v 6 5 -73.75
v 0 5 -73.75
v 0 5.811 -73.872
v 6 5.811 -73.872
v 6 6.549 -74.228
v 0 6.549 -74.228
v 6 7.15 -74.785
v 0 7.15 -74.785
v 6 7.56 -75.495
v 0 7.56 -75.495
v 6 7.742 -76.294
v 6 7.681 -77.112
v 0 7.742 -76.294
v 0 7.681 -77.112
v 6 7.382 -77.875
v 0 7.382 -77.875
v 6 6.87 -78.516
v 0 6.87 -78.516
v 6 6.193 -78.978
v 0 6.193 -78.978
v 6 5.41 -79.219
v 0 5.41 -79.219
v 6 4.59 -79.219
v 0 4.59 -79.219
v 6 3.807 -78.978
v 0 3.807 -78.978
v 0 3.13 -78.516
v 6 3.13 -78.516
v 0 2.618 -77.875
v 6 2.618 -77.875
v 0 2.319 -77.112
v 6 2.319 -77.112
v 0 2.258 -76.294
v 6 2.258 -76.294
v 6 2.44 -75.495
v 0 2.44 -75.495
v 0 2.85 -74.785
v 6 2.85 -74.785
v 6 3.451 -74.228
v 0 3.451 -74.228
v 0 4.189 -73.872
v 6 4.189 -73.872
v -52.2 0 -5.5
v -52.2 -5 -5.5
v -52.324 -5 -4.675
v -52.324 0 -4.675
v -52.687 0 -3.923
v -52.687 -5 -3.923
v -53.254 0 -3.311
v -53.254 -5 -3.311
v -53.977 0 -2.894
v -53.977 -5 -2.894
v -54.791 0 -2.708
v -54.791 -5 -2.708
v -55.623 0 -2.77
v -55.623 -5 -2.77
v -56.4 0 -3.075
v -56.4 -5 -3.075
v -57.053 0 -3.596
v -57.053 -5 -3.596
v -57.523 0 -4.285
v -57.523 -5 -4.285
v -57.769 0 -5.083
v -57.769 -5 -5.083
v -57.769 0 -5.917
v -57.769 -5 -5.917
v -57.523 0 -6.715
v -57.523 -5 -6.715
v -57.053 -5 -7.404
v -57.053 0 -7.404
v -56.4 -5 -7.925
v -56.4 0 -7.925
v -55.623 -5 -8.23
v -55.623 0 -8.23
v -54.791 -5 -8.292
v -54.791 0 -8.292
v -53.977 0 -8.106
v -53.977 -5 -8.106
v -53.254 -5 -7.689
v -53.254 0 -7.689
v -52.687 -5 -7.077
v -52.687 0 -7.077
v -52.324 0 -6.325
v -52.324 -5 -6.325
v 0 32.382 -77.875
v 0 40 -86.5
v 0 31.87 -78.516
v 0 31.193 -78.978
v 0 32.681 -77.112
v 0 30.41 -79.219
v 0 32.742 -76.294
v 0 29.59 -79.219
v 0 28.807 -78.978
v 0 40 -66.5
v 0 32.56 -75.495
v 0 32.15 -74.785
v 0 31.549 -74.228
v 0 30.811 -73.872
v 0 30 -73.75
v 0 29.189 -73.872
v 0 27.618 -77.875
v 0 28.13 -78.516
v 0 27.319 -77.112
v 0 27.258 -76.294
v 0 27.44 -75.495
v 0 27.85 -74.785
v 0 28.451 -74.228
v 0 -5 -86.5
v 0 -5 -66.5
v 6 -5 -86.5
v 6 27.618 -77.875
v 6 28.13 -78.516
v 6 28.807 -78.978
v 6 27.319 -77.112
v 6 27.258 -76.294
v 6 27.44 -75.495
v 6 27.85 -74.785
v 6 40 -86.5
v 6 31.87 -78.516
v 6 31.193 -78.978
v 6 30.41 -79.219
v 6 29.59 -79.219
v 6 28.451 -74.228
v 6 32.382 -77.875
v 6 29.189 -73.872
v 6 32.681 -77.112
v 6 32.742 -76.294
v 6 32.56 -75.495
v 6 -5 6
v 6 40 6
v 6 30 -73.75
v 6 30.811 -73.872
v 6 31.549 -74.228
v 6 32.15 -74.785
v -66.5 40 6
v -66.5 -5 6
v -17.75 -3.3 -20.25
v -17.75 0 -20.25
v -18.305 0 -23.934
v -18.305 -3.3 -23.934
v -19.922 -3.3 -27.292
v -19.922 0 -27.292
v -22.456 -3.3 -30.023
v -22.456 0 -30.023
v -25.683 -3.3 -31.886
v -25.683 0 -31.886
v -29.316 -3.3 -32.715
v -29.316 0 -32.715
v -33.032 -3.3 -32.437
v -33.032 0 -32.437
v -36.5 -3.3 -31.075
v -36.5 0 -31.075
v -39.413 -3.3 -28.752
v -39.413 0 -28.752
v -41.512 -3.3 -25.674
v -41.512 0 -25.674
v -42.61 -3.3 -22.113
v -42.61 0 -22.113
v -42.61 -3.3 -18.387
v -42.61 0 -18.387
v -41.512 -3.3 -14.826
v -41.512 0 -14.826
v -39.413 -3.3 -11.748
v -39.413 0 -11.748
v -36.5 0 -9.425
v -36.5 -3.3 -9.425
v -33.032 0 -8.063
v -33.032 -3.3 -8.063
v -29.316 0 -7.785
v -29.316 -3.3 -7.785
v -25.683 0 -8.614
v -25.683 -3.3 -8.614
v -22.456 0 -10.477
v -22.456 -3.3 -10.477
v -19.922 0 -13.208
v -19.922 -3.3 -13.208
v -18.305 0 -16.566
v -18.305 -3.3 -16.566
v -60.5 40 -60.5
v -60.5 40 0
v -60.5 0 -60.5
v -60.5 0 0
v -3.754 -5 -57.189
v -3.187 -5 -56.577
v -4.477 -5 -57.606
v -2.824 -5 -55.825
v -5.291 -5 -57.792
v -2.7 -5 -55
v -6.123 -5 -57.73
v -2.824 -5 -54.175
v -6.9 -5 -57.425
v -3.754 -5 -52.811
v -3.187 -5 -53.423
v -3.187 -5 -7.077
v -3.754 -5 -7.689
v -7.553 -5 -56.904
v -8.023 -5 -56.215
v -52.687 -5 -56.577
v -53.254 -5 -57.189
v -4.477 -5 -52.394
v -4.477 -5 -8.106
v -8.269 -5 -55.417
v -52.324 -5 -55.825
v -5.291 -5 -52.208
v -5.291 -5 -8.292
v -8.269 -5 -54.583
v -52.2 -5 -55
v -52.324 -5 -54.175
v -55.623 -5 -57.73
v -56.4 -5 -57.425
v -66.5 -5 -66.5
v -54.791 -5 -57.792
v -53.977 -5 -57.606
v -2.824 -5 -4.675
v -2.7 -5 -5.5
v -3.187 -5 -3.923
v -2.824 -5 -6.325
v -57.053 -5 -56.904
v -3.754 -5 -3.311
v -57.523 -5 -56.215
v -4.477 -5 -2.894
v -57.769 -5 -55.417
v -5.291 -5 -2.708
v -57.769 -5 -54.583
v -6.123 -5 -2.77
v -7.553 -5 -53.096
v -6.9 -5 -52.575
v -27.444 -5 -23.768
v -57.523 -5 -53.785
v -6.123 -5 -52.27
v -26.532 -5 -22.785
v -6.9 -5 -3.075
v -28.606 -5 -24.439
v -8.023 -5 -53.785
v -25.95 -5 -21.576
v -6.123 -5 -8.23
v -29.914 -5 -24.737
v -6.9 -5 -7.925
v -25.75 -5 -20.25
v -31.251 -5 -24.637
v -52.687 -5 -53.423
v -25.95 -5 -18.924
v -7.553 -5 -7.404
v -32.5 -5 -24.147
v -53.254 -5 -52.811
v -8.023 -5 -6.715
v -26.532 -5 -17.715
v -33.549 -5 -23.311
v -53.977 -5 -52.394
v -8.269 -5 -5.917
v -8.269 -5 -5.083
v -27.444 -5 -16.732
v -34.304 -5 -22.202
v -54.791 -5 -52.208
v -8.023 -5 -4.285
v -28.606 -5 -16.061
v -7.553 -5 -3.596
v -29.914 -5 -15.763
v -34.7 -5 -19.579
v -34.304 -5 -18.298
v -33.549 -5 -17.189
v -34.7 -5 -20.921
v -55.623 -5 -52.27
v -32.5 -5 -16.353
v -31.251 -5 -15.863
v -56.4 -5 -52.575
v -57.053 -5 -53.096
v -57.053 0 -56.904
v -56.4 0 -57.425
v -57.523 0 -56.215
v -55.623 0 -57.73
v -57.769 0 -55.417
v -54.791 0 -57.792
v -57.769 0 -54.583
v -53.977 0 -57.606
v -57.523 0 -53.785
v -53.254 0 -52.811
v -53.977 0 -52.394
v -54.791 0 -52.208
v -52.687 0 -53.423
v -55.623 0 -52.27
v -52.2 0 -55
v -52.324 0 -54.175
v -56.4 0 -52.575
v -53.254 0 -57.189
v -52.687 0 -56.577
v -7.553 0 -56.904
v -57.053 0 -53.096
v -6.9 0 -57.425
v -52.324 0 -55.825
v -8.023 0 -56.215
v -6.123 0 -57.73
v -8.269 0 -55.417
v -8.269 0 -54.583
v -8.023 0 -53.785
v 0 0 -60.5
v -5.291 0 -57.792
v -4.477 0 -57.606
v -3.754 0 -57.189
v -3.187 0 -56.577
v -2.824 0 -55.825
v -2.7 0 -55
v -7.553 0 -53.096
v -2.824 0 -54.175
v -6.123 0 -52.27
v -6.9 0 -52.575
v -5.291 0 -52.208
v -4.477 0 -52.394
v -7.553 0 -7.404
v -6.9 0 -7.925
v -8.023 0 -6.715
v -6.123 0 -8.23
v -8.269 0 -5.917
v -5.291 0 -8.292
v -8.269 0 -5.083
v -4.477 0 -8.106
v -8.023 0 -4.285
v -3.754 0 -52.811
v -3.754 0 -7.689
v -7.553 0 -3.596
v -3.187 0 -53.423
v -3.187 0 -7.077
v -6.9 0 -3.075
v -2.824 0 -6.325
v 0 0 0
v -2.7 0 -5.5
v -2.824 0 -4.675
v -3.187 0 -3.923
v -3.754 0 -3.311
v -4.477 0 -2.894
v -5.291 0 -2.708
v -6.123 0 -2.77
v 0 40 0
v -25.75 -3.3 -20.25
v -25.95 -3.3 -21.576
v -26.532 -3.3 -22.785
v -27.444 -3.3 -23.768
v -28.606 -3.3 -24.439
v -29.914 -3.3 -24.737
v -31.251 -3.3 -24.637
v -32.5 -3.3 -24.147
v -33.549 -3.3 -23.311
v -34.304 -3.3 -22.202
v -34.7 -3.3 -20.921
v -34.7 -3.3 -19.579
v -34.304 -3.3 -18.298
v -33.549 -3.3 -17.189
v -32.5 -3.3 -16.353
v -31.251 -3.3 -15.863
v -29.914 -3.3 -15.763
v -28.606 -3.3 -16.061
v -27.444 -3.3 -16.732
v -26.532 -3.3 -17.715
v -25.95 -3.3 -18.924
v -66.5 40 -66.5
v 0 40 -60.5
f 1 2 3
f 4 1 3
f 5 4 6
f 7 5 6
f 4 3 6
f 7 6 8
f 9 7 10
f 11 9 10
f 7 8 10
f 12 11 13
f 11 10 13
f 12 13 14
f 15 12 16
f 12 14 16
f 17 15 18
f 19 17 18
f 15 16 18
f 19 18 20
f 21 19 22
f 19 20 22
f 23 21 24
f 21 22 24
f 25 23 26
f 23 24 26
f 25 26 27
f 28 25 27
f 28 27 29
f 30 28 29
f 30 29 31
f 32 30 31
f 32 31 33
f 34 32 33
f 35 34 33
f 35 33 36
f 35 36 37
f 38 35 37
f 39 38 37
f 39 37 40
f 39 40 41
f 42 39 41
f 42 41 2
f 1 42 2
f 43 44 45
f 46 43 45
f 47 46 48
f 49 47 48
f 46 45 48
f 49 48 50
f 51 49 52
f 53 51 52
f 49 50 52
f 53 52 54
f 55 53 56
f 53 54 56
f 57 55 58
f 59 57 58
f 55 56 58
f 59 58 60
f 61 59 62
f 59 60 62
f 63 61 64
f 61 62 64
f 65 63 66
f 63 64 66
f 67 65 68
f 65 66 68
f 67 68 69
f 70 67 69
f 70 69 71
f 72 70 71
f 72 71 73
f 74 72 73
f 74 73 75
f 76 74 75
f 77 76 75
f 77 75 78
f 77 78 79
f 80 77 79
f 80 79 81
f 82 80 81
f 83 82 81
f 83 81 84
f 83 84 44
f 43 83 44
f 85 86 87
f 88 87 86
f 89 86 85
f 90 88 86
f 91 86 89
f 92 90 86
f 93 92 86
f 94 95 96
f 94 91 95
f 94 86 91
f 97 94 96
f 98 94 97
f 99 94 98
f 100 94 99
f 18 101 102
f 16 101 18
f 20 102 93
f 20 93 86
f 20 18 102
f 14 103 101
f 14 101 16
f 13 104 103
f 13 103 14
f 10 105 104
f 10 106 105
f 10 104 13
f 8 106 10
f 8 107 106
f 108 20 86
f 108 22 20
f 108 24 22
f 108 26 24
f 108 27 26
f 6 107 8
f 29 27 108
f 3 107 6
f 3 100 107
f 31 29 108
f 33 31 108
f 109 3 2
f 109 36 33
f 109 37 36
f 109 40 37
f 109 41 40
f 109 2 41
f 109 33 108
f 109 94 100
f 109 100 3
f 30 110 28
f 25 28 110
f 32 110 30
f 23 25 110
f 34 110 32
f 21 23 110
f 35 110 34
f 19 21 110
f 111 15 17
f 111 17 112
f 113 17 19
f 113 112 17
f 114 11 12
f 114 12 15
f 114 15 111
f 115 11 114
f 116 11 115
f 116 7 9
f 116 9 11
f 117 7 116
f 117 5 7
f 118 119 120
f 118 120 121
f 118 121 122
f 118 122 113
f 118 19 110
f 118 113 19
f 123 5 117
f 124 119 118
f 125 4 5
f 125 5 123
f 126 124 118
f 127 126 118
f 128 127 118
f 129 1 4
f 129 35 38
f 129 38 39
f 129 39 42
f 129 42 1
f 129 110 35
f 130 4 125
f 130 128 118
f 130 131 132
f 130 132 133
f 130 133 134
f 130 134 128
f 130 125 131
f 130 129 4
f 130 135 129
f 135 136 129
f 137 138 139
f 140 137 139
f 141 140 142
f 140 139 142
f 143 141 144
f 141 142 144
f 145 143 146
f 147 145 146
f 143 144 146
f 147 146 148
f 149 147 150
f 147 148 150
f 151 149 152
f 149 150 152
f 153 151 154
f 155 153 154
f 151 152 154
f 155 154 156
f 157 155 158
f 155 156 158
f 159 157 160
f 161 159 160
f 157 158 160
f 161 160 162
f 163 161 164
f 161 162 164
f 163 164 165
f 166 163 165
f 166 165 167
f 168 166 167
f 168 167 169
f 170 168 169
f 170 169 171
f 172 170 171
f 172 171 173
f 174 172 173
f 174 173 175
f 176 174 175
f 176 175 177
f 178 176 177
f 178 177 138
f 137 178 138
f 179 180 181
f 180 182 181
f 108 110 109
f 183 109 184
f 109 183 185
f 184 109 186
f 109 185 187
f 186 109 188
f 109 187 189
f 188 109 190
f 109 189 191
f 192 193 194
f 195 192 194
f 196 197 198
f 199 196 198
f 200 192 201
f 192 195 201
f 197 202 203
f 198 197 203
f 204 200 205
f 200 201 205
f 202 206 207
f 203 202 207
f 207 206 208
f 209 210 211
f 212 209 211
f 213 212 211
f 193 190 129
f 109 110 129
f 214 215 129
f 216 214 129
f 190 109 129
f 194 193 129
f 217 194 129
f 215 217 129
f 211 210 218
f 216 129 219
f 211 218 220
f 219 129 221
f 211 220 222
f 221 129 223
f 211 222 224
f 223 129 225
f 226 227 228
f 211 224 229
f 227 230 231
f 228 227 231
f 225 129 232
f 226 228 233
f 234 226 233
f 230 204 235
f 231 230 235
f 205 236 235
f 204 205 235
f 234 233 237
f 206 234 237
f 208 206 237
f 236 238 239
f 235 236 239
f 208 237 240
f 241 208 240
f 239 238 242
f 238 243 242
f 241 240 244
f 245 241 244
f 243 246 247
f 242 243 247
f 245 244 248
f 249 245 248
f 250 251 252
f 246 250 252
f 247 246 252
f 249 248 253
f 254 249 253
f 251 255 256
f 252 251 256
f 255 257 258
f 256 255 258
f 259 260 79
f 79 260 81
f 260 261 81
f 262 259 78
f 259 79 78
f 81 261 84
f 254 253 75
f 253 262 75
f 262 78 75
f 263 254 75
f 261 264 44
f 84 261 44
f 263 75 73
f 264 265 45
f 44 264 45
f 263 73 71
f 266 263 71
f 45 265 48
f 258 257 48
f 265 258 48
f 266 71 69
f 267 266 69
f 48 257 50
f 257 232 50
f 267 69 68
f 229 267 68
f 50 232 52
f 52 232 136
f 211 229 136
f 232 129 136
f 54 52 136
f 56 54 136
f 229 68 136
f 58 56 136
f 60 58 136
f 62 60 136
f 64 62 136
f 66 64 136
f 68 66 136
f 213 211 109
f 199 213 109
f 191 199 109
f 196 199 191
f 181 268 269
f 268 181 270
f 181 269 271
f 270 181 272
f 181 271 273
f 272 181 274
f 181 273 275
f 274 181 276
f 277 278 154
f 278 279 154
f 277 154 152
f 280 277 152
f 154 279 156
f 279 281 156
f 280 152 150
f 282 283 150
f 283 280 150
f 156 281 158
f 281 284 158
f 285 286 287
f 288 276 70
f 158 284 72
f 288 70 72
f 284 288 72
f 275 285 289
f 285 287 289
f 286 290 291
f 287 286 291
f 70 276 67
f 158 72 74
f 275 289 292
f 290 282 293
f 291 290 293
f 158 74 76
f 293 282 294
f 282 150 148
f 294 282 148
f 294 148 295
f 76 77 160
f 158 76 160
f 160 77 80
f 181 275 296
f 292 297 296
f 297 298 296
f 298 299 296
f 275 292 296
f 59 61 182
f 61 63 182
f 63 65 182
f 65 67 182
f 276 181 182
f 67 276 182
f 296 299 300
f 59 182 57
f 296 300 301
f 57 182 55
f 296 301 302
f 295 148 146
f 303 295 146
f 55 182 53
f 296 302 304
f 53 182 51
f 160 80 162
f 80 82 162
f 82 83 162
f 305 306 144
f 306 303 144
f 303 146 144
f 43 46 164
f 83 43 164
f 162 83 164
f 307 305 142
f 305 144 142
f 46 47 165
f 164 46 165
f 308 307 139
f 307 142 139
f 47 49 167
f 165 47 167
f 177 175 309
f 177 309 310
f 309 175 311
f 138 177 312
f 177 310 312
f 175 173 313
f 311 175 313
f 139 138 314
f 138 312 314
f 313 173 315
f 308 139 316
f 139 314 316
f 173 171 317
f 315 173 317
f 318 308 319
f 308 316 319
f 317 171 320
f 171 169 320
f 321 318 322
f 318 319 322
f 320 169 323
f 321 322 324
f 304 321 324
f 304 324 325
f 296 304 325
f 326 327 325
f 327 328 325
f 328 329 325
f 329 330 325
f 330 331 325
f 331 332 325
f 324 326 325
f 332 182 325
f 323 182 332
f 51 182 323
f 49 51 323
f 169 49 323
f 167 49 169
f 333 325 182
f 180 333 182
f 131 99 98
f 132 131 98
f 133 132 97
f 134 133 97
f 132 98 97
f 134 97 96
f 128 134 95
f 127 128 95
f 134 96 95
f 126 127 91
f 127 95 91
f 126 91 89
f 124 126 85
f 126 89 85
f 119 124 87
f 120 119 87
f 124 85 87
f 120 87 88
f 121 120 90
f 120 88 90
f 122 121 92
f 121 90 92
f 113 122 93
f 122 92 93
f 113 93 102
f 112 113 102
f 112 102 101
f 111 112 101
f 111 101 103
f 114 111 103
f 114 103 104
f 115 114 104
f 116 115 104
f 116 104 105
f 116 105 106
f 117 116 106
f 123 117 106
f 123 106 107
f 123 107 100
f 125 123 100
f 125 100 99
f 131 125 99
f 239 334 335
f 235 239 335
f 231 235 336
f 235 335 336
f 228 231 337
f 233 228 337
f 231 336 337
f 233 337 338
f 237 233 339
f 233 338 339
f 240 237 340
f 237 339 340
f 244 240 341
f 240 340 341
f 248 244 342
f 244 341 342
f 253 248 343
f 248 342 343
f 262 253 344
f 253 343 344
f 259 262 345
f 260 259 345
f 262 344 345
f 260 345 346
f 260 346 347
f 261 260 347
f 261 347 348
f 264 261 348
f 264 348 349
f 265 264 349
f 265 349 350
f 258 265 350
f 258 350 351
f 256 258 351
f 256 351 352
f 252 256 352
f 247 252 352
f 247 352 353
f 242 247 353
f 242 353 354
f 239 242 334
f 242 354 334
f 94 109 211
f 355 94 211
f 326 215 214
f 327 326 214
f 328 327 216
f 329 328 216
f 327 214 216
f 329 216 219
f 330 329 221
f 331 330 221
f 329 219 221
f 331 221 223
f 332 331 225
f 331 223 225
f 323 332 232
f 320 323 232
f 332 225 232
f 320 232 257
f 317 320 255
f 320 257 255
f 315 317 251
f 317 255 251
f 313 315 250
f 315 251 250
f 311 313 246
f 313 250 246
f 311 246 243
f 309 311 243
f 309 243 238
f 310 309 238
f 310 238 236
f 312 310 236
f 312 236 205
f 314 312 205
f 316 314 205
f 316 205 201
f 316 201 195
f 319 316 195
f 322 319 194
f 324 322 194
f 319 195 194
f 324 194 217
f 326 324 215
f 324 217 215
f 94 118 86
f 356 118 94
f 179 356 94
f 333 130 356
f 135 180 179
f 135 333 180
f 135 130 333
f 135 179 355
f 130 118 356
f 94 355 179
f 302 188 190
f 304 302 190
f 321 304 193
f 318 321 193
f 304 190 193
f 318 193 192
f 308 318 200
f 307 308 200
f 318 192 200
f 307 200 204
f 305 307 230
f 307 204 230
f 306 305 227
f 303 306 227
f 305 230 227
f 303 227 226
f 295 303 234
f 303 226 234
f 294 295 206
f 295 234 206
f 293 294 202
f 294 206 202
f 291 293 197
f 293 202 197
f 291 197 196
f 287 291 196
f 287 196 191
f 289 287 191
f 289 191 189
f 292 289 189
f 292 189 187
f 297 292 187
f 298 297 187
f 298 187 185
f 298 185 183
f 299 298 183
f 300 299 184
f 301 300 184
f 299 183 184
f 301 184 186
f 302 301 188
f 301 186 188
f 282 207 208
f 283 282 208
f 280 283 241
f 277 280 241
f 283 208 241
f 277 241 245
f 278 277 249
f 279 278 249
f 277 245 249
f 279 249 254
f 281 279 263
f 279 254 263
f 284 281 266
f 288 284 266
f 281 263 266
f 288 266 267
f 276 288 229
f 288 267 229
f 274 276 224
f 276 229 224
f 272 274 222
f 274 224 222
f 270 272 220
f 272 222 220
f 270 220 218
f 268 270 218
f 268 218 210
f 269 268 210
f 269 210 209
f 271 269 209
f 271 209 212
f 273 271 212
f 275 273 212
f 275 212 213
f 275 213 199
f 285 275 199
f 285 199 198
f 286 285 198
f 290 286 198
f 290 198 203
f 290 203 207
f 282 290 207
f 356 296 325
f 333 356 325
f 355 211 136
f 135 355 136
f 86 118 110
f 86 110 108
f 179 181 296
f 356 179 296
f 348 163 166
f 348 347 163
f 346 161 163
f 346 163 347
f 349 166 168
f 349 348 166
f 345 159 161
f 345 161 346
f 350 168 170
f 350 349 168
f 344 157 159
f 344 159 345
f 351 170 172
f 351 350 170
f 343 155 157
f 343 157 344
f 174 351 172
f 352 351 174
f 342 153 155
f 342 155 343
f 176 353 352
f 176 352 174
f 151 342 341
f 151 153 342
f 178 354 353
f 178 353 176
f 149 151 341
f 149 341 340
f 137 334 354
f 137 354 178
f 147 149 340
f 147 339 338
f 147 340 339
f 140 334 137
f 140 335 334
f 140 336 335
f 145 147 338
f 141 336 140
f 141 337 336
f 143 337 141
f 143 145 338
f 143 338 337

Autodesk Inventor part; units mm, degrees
ref_plane "YZ Plane" through (0, 0, 0) normal (1, 0, 0) x (0, 1, 0)
ref_plane "XZ Plane" through (0, 0, 0) normal (0, 1, 0) x (-1, 0, 0)
ref_plane "XY Plane" through (0, 0, 0) normal (0, 0, 1) x (1, 0, 0)
sketch "Sketch1" plane through (0, 0, 0) normal (0, 1, 0) x (-1, 0, 0)
  line L0 (0, 0) -> (60.5, 0)
  line L1 (60.5, 0) -> (60.5, -60.5)
  line L2 (60.5, -60.5) -> (0, -60.5)
  line L3 (0, -60.5) -> (0, 0)
  line L4 (-6, -66.5) -> (66.5, -66.5)
  line L5 (66.5, -66.5) -> (66.5, 6)
  line L6 (66.5, 6) -> (-6, 6)
  line L7 (-6, 6) -> (-6, -66.5)
  dimension "d0" = 60.5
  dimension "d1" = 60.5
  dimension "d2" = 6
extrude "Extrusion1" add sketch "Sketch1" along normal blind 40
sketch "Sketch2" plane through (0, 0, 0) normal (0, -1, 0) x (1, 0, 0)
  line L0 (-66.5, -60.5) -> (-66.5, 6)
  line L1 (-66.5, 6) -> (6, 6)
  line L2 (6, 6) -> (6, -66.5)
  line L3 (6, -66.5) -> (-66.5, -66.5)
  line L4 (-66.5, -66.5) -> (-66.5, 6)
  point P0 (0, 0)
  point P1 (-63.5, -63.5)
  dimension "d5" = 72.5
  dimension "d6" = 72.5
  dimension "d62" = 6
  dimension "d63" = 6
extrude "Extrusion2" add sketch "Sketch2" along normal blind 5
sketch "Sketch3" plane through (0, -5, 0) normal (0, -1, 0) x (1, 0, 0)
  line L0 (20, -30.25) -> (-80, -30.25) construction
  line L1 (-30.25, 20) -> (-30.25, -80) construction
  circle A0 centre (-55, -5.5) radius 2.8
  circle A1 centre (-5.5, -5.5) radius 2.8
  circle A2 centre (-55, -55) radius 2.8
  circle A3 centre (-5.5, -55) radius 2.8
  point P0 (0, 0)
  dimension "d9" = 100
  dimension "d10" = 30.25
  dimension "d11" = 100
  dimension "d12" = 30.25
  dimension "d13" = 24.75
  dimension "d14" = 24.75
  dimension "d15" = 5.6
  dimension "d18" = 49.5
  dimension "d21" = 49.5
extrude "Extrusion3" cut sketch "Sketch3" against normal blind 5
sketch "Sketch4" plane through (0, 0, 0) normal (0, 1, 0) x (1, 0, 0)
  line L0 (20, 30.25) -> (-80, 30.25) construction
  line L1 (0, 0) -> (-60.5, 0) construction
  line L2 (-30.25, -20) -> (-30.25, 80) construction
  line L3 (0, 60.5) -> (0, 0) construction
  circle A0 centre (-30.25, 20.25) radius 12.5
  dimension "d26" = 100
  dimension "d27" = 30.25
  dimension "d28" = 100
  dimension "d29" = 30.25
  dimension "d30" = 25
  dimension "d31" = 10
extrude "Extrusion4" cut sketch "Sketch4" against normal blind 3.3
sketch "Sketch5" plane through (-30.25, -3.3, -20.25) normal (0, 1, 0) x (1, 0, 0)
  circle A0 centre (0, 0) radius 4.5
  point P0 (30.25, -20.25)
  dimension "d34" = 9
extrude "Extrusion5" cut sketch "Sketch5" against normal blind 2
sketch "Sketch8" plane through (6, 40, -66.5) normal (0, 0, -1) x (-1, 0, 0)
  line L0 (0, 0) -> (72.5, 0) projected
  line L1 (0, -45) -> (72.5, -45) projected
  line L2 (0, 0) -> (6, 0)
  line L3 (6, 0) -> (6, -45)
  line L4 (6, -45) -> (0, -45)
  line L5 (0, -45) -> (0, 0)
  point P0 (6, -40)
  dimension "d64" = 6
extrude "Extrusion8" add sketch "Sketch8" along normal blind 20
sketch "Sketch9" plane through (0, -5, -66.5) normal (-1, 0, 0) x (0, 0, 1)
  circle A0 centre (-10, 10) radius 2.75
  line L0 (-20, 0) -> (-20, 45) projected
  line L1 (0, 0) -> (-20, 0) projected
  circle A1 centre (-10, 35) radius 2.75
  line L2 (0, 45) -> (-20, 45) projected
  point P0 (66.5, 5)
  dimension "d67" = 5.5
  dimension "d68" = 10
  dimension "d69" = 10
  dimension "d70" = 5.5
  dimension "d71" = 10
  dimension "d72" = 10
extrude "Extrusion9" cut sketch "Sketch9" against normal blind 6
properties part number "soporte motor"
